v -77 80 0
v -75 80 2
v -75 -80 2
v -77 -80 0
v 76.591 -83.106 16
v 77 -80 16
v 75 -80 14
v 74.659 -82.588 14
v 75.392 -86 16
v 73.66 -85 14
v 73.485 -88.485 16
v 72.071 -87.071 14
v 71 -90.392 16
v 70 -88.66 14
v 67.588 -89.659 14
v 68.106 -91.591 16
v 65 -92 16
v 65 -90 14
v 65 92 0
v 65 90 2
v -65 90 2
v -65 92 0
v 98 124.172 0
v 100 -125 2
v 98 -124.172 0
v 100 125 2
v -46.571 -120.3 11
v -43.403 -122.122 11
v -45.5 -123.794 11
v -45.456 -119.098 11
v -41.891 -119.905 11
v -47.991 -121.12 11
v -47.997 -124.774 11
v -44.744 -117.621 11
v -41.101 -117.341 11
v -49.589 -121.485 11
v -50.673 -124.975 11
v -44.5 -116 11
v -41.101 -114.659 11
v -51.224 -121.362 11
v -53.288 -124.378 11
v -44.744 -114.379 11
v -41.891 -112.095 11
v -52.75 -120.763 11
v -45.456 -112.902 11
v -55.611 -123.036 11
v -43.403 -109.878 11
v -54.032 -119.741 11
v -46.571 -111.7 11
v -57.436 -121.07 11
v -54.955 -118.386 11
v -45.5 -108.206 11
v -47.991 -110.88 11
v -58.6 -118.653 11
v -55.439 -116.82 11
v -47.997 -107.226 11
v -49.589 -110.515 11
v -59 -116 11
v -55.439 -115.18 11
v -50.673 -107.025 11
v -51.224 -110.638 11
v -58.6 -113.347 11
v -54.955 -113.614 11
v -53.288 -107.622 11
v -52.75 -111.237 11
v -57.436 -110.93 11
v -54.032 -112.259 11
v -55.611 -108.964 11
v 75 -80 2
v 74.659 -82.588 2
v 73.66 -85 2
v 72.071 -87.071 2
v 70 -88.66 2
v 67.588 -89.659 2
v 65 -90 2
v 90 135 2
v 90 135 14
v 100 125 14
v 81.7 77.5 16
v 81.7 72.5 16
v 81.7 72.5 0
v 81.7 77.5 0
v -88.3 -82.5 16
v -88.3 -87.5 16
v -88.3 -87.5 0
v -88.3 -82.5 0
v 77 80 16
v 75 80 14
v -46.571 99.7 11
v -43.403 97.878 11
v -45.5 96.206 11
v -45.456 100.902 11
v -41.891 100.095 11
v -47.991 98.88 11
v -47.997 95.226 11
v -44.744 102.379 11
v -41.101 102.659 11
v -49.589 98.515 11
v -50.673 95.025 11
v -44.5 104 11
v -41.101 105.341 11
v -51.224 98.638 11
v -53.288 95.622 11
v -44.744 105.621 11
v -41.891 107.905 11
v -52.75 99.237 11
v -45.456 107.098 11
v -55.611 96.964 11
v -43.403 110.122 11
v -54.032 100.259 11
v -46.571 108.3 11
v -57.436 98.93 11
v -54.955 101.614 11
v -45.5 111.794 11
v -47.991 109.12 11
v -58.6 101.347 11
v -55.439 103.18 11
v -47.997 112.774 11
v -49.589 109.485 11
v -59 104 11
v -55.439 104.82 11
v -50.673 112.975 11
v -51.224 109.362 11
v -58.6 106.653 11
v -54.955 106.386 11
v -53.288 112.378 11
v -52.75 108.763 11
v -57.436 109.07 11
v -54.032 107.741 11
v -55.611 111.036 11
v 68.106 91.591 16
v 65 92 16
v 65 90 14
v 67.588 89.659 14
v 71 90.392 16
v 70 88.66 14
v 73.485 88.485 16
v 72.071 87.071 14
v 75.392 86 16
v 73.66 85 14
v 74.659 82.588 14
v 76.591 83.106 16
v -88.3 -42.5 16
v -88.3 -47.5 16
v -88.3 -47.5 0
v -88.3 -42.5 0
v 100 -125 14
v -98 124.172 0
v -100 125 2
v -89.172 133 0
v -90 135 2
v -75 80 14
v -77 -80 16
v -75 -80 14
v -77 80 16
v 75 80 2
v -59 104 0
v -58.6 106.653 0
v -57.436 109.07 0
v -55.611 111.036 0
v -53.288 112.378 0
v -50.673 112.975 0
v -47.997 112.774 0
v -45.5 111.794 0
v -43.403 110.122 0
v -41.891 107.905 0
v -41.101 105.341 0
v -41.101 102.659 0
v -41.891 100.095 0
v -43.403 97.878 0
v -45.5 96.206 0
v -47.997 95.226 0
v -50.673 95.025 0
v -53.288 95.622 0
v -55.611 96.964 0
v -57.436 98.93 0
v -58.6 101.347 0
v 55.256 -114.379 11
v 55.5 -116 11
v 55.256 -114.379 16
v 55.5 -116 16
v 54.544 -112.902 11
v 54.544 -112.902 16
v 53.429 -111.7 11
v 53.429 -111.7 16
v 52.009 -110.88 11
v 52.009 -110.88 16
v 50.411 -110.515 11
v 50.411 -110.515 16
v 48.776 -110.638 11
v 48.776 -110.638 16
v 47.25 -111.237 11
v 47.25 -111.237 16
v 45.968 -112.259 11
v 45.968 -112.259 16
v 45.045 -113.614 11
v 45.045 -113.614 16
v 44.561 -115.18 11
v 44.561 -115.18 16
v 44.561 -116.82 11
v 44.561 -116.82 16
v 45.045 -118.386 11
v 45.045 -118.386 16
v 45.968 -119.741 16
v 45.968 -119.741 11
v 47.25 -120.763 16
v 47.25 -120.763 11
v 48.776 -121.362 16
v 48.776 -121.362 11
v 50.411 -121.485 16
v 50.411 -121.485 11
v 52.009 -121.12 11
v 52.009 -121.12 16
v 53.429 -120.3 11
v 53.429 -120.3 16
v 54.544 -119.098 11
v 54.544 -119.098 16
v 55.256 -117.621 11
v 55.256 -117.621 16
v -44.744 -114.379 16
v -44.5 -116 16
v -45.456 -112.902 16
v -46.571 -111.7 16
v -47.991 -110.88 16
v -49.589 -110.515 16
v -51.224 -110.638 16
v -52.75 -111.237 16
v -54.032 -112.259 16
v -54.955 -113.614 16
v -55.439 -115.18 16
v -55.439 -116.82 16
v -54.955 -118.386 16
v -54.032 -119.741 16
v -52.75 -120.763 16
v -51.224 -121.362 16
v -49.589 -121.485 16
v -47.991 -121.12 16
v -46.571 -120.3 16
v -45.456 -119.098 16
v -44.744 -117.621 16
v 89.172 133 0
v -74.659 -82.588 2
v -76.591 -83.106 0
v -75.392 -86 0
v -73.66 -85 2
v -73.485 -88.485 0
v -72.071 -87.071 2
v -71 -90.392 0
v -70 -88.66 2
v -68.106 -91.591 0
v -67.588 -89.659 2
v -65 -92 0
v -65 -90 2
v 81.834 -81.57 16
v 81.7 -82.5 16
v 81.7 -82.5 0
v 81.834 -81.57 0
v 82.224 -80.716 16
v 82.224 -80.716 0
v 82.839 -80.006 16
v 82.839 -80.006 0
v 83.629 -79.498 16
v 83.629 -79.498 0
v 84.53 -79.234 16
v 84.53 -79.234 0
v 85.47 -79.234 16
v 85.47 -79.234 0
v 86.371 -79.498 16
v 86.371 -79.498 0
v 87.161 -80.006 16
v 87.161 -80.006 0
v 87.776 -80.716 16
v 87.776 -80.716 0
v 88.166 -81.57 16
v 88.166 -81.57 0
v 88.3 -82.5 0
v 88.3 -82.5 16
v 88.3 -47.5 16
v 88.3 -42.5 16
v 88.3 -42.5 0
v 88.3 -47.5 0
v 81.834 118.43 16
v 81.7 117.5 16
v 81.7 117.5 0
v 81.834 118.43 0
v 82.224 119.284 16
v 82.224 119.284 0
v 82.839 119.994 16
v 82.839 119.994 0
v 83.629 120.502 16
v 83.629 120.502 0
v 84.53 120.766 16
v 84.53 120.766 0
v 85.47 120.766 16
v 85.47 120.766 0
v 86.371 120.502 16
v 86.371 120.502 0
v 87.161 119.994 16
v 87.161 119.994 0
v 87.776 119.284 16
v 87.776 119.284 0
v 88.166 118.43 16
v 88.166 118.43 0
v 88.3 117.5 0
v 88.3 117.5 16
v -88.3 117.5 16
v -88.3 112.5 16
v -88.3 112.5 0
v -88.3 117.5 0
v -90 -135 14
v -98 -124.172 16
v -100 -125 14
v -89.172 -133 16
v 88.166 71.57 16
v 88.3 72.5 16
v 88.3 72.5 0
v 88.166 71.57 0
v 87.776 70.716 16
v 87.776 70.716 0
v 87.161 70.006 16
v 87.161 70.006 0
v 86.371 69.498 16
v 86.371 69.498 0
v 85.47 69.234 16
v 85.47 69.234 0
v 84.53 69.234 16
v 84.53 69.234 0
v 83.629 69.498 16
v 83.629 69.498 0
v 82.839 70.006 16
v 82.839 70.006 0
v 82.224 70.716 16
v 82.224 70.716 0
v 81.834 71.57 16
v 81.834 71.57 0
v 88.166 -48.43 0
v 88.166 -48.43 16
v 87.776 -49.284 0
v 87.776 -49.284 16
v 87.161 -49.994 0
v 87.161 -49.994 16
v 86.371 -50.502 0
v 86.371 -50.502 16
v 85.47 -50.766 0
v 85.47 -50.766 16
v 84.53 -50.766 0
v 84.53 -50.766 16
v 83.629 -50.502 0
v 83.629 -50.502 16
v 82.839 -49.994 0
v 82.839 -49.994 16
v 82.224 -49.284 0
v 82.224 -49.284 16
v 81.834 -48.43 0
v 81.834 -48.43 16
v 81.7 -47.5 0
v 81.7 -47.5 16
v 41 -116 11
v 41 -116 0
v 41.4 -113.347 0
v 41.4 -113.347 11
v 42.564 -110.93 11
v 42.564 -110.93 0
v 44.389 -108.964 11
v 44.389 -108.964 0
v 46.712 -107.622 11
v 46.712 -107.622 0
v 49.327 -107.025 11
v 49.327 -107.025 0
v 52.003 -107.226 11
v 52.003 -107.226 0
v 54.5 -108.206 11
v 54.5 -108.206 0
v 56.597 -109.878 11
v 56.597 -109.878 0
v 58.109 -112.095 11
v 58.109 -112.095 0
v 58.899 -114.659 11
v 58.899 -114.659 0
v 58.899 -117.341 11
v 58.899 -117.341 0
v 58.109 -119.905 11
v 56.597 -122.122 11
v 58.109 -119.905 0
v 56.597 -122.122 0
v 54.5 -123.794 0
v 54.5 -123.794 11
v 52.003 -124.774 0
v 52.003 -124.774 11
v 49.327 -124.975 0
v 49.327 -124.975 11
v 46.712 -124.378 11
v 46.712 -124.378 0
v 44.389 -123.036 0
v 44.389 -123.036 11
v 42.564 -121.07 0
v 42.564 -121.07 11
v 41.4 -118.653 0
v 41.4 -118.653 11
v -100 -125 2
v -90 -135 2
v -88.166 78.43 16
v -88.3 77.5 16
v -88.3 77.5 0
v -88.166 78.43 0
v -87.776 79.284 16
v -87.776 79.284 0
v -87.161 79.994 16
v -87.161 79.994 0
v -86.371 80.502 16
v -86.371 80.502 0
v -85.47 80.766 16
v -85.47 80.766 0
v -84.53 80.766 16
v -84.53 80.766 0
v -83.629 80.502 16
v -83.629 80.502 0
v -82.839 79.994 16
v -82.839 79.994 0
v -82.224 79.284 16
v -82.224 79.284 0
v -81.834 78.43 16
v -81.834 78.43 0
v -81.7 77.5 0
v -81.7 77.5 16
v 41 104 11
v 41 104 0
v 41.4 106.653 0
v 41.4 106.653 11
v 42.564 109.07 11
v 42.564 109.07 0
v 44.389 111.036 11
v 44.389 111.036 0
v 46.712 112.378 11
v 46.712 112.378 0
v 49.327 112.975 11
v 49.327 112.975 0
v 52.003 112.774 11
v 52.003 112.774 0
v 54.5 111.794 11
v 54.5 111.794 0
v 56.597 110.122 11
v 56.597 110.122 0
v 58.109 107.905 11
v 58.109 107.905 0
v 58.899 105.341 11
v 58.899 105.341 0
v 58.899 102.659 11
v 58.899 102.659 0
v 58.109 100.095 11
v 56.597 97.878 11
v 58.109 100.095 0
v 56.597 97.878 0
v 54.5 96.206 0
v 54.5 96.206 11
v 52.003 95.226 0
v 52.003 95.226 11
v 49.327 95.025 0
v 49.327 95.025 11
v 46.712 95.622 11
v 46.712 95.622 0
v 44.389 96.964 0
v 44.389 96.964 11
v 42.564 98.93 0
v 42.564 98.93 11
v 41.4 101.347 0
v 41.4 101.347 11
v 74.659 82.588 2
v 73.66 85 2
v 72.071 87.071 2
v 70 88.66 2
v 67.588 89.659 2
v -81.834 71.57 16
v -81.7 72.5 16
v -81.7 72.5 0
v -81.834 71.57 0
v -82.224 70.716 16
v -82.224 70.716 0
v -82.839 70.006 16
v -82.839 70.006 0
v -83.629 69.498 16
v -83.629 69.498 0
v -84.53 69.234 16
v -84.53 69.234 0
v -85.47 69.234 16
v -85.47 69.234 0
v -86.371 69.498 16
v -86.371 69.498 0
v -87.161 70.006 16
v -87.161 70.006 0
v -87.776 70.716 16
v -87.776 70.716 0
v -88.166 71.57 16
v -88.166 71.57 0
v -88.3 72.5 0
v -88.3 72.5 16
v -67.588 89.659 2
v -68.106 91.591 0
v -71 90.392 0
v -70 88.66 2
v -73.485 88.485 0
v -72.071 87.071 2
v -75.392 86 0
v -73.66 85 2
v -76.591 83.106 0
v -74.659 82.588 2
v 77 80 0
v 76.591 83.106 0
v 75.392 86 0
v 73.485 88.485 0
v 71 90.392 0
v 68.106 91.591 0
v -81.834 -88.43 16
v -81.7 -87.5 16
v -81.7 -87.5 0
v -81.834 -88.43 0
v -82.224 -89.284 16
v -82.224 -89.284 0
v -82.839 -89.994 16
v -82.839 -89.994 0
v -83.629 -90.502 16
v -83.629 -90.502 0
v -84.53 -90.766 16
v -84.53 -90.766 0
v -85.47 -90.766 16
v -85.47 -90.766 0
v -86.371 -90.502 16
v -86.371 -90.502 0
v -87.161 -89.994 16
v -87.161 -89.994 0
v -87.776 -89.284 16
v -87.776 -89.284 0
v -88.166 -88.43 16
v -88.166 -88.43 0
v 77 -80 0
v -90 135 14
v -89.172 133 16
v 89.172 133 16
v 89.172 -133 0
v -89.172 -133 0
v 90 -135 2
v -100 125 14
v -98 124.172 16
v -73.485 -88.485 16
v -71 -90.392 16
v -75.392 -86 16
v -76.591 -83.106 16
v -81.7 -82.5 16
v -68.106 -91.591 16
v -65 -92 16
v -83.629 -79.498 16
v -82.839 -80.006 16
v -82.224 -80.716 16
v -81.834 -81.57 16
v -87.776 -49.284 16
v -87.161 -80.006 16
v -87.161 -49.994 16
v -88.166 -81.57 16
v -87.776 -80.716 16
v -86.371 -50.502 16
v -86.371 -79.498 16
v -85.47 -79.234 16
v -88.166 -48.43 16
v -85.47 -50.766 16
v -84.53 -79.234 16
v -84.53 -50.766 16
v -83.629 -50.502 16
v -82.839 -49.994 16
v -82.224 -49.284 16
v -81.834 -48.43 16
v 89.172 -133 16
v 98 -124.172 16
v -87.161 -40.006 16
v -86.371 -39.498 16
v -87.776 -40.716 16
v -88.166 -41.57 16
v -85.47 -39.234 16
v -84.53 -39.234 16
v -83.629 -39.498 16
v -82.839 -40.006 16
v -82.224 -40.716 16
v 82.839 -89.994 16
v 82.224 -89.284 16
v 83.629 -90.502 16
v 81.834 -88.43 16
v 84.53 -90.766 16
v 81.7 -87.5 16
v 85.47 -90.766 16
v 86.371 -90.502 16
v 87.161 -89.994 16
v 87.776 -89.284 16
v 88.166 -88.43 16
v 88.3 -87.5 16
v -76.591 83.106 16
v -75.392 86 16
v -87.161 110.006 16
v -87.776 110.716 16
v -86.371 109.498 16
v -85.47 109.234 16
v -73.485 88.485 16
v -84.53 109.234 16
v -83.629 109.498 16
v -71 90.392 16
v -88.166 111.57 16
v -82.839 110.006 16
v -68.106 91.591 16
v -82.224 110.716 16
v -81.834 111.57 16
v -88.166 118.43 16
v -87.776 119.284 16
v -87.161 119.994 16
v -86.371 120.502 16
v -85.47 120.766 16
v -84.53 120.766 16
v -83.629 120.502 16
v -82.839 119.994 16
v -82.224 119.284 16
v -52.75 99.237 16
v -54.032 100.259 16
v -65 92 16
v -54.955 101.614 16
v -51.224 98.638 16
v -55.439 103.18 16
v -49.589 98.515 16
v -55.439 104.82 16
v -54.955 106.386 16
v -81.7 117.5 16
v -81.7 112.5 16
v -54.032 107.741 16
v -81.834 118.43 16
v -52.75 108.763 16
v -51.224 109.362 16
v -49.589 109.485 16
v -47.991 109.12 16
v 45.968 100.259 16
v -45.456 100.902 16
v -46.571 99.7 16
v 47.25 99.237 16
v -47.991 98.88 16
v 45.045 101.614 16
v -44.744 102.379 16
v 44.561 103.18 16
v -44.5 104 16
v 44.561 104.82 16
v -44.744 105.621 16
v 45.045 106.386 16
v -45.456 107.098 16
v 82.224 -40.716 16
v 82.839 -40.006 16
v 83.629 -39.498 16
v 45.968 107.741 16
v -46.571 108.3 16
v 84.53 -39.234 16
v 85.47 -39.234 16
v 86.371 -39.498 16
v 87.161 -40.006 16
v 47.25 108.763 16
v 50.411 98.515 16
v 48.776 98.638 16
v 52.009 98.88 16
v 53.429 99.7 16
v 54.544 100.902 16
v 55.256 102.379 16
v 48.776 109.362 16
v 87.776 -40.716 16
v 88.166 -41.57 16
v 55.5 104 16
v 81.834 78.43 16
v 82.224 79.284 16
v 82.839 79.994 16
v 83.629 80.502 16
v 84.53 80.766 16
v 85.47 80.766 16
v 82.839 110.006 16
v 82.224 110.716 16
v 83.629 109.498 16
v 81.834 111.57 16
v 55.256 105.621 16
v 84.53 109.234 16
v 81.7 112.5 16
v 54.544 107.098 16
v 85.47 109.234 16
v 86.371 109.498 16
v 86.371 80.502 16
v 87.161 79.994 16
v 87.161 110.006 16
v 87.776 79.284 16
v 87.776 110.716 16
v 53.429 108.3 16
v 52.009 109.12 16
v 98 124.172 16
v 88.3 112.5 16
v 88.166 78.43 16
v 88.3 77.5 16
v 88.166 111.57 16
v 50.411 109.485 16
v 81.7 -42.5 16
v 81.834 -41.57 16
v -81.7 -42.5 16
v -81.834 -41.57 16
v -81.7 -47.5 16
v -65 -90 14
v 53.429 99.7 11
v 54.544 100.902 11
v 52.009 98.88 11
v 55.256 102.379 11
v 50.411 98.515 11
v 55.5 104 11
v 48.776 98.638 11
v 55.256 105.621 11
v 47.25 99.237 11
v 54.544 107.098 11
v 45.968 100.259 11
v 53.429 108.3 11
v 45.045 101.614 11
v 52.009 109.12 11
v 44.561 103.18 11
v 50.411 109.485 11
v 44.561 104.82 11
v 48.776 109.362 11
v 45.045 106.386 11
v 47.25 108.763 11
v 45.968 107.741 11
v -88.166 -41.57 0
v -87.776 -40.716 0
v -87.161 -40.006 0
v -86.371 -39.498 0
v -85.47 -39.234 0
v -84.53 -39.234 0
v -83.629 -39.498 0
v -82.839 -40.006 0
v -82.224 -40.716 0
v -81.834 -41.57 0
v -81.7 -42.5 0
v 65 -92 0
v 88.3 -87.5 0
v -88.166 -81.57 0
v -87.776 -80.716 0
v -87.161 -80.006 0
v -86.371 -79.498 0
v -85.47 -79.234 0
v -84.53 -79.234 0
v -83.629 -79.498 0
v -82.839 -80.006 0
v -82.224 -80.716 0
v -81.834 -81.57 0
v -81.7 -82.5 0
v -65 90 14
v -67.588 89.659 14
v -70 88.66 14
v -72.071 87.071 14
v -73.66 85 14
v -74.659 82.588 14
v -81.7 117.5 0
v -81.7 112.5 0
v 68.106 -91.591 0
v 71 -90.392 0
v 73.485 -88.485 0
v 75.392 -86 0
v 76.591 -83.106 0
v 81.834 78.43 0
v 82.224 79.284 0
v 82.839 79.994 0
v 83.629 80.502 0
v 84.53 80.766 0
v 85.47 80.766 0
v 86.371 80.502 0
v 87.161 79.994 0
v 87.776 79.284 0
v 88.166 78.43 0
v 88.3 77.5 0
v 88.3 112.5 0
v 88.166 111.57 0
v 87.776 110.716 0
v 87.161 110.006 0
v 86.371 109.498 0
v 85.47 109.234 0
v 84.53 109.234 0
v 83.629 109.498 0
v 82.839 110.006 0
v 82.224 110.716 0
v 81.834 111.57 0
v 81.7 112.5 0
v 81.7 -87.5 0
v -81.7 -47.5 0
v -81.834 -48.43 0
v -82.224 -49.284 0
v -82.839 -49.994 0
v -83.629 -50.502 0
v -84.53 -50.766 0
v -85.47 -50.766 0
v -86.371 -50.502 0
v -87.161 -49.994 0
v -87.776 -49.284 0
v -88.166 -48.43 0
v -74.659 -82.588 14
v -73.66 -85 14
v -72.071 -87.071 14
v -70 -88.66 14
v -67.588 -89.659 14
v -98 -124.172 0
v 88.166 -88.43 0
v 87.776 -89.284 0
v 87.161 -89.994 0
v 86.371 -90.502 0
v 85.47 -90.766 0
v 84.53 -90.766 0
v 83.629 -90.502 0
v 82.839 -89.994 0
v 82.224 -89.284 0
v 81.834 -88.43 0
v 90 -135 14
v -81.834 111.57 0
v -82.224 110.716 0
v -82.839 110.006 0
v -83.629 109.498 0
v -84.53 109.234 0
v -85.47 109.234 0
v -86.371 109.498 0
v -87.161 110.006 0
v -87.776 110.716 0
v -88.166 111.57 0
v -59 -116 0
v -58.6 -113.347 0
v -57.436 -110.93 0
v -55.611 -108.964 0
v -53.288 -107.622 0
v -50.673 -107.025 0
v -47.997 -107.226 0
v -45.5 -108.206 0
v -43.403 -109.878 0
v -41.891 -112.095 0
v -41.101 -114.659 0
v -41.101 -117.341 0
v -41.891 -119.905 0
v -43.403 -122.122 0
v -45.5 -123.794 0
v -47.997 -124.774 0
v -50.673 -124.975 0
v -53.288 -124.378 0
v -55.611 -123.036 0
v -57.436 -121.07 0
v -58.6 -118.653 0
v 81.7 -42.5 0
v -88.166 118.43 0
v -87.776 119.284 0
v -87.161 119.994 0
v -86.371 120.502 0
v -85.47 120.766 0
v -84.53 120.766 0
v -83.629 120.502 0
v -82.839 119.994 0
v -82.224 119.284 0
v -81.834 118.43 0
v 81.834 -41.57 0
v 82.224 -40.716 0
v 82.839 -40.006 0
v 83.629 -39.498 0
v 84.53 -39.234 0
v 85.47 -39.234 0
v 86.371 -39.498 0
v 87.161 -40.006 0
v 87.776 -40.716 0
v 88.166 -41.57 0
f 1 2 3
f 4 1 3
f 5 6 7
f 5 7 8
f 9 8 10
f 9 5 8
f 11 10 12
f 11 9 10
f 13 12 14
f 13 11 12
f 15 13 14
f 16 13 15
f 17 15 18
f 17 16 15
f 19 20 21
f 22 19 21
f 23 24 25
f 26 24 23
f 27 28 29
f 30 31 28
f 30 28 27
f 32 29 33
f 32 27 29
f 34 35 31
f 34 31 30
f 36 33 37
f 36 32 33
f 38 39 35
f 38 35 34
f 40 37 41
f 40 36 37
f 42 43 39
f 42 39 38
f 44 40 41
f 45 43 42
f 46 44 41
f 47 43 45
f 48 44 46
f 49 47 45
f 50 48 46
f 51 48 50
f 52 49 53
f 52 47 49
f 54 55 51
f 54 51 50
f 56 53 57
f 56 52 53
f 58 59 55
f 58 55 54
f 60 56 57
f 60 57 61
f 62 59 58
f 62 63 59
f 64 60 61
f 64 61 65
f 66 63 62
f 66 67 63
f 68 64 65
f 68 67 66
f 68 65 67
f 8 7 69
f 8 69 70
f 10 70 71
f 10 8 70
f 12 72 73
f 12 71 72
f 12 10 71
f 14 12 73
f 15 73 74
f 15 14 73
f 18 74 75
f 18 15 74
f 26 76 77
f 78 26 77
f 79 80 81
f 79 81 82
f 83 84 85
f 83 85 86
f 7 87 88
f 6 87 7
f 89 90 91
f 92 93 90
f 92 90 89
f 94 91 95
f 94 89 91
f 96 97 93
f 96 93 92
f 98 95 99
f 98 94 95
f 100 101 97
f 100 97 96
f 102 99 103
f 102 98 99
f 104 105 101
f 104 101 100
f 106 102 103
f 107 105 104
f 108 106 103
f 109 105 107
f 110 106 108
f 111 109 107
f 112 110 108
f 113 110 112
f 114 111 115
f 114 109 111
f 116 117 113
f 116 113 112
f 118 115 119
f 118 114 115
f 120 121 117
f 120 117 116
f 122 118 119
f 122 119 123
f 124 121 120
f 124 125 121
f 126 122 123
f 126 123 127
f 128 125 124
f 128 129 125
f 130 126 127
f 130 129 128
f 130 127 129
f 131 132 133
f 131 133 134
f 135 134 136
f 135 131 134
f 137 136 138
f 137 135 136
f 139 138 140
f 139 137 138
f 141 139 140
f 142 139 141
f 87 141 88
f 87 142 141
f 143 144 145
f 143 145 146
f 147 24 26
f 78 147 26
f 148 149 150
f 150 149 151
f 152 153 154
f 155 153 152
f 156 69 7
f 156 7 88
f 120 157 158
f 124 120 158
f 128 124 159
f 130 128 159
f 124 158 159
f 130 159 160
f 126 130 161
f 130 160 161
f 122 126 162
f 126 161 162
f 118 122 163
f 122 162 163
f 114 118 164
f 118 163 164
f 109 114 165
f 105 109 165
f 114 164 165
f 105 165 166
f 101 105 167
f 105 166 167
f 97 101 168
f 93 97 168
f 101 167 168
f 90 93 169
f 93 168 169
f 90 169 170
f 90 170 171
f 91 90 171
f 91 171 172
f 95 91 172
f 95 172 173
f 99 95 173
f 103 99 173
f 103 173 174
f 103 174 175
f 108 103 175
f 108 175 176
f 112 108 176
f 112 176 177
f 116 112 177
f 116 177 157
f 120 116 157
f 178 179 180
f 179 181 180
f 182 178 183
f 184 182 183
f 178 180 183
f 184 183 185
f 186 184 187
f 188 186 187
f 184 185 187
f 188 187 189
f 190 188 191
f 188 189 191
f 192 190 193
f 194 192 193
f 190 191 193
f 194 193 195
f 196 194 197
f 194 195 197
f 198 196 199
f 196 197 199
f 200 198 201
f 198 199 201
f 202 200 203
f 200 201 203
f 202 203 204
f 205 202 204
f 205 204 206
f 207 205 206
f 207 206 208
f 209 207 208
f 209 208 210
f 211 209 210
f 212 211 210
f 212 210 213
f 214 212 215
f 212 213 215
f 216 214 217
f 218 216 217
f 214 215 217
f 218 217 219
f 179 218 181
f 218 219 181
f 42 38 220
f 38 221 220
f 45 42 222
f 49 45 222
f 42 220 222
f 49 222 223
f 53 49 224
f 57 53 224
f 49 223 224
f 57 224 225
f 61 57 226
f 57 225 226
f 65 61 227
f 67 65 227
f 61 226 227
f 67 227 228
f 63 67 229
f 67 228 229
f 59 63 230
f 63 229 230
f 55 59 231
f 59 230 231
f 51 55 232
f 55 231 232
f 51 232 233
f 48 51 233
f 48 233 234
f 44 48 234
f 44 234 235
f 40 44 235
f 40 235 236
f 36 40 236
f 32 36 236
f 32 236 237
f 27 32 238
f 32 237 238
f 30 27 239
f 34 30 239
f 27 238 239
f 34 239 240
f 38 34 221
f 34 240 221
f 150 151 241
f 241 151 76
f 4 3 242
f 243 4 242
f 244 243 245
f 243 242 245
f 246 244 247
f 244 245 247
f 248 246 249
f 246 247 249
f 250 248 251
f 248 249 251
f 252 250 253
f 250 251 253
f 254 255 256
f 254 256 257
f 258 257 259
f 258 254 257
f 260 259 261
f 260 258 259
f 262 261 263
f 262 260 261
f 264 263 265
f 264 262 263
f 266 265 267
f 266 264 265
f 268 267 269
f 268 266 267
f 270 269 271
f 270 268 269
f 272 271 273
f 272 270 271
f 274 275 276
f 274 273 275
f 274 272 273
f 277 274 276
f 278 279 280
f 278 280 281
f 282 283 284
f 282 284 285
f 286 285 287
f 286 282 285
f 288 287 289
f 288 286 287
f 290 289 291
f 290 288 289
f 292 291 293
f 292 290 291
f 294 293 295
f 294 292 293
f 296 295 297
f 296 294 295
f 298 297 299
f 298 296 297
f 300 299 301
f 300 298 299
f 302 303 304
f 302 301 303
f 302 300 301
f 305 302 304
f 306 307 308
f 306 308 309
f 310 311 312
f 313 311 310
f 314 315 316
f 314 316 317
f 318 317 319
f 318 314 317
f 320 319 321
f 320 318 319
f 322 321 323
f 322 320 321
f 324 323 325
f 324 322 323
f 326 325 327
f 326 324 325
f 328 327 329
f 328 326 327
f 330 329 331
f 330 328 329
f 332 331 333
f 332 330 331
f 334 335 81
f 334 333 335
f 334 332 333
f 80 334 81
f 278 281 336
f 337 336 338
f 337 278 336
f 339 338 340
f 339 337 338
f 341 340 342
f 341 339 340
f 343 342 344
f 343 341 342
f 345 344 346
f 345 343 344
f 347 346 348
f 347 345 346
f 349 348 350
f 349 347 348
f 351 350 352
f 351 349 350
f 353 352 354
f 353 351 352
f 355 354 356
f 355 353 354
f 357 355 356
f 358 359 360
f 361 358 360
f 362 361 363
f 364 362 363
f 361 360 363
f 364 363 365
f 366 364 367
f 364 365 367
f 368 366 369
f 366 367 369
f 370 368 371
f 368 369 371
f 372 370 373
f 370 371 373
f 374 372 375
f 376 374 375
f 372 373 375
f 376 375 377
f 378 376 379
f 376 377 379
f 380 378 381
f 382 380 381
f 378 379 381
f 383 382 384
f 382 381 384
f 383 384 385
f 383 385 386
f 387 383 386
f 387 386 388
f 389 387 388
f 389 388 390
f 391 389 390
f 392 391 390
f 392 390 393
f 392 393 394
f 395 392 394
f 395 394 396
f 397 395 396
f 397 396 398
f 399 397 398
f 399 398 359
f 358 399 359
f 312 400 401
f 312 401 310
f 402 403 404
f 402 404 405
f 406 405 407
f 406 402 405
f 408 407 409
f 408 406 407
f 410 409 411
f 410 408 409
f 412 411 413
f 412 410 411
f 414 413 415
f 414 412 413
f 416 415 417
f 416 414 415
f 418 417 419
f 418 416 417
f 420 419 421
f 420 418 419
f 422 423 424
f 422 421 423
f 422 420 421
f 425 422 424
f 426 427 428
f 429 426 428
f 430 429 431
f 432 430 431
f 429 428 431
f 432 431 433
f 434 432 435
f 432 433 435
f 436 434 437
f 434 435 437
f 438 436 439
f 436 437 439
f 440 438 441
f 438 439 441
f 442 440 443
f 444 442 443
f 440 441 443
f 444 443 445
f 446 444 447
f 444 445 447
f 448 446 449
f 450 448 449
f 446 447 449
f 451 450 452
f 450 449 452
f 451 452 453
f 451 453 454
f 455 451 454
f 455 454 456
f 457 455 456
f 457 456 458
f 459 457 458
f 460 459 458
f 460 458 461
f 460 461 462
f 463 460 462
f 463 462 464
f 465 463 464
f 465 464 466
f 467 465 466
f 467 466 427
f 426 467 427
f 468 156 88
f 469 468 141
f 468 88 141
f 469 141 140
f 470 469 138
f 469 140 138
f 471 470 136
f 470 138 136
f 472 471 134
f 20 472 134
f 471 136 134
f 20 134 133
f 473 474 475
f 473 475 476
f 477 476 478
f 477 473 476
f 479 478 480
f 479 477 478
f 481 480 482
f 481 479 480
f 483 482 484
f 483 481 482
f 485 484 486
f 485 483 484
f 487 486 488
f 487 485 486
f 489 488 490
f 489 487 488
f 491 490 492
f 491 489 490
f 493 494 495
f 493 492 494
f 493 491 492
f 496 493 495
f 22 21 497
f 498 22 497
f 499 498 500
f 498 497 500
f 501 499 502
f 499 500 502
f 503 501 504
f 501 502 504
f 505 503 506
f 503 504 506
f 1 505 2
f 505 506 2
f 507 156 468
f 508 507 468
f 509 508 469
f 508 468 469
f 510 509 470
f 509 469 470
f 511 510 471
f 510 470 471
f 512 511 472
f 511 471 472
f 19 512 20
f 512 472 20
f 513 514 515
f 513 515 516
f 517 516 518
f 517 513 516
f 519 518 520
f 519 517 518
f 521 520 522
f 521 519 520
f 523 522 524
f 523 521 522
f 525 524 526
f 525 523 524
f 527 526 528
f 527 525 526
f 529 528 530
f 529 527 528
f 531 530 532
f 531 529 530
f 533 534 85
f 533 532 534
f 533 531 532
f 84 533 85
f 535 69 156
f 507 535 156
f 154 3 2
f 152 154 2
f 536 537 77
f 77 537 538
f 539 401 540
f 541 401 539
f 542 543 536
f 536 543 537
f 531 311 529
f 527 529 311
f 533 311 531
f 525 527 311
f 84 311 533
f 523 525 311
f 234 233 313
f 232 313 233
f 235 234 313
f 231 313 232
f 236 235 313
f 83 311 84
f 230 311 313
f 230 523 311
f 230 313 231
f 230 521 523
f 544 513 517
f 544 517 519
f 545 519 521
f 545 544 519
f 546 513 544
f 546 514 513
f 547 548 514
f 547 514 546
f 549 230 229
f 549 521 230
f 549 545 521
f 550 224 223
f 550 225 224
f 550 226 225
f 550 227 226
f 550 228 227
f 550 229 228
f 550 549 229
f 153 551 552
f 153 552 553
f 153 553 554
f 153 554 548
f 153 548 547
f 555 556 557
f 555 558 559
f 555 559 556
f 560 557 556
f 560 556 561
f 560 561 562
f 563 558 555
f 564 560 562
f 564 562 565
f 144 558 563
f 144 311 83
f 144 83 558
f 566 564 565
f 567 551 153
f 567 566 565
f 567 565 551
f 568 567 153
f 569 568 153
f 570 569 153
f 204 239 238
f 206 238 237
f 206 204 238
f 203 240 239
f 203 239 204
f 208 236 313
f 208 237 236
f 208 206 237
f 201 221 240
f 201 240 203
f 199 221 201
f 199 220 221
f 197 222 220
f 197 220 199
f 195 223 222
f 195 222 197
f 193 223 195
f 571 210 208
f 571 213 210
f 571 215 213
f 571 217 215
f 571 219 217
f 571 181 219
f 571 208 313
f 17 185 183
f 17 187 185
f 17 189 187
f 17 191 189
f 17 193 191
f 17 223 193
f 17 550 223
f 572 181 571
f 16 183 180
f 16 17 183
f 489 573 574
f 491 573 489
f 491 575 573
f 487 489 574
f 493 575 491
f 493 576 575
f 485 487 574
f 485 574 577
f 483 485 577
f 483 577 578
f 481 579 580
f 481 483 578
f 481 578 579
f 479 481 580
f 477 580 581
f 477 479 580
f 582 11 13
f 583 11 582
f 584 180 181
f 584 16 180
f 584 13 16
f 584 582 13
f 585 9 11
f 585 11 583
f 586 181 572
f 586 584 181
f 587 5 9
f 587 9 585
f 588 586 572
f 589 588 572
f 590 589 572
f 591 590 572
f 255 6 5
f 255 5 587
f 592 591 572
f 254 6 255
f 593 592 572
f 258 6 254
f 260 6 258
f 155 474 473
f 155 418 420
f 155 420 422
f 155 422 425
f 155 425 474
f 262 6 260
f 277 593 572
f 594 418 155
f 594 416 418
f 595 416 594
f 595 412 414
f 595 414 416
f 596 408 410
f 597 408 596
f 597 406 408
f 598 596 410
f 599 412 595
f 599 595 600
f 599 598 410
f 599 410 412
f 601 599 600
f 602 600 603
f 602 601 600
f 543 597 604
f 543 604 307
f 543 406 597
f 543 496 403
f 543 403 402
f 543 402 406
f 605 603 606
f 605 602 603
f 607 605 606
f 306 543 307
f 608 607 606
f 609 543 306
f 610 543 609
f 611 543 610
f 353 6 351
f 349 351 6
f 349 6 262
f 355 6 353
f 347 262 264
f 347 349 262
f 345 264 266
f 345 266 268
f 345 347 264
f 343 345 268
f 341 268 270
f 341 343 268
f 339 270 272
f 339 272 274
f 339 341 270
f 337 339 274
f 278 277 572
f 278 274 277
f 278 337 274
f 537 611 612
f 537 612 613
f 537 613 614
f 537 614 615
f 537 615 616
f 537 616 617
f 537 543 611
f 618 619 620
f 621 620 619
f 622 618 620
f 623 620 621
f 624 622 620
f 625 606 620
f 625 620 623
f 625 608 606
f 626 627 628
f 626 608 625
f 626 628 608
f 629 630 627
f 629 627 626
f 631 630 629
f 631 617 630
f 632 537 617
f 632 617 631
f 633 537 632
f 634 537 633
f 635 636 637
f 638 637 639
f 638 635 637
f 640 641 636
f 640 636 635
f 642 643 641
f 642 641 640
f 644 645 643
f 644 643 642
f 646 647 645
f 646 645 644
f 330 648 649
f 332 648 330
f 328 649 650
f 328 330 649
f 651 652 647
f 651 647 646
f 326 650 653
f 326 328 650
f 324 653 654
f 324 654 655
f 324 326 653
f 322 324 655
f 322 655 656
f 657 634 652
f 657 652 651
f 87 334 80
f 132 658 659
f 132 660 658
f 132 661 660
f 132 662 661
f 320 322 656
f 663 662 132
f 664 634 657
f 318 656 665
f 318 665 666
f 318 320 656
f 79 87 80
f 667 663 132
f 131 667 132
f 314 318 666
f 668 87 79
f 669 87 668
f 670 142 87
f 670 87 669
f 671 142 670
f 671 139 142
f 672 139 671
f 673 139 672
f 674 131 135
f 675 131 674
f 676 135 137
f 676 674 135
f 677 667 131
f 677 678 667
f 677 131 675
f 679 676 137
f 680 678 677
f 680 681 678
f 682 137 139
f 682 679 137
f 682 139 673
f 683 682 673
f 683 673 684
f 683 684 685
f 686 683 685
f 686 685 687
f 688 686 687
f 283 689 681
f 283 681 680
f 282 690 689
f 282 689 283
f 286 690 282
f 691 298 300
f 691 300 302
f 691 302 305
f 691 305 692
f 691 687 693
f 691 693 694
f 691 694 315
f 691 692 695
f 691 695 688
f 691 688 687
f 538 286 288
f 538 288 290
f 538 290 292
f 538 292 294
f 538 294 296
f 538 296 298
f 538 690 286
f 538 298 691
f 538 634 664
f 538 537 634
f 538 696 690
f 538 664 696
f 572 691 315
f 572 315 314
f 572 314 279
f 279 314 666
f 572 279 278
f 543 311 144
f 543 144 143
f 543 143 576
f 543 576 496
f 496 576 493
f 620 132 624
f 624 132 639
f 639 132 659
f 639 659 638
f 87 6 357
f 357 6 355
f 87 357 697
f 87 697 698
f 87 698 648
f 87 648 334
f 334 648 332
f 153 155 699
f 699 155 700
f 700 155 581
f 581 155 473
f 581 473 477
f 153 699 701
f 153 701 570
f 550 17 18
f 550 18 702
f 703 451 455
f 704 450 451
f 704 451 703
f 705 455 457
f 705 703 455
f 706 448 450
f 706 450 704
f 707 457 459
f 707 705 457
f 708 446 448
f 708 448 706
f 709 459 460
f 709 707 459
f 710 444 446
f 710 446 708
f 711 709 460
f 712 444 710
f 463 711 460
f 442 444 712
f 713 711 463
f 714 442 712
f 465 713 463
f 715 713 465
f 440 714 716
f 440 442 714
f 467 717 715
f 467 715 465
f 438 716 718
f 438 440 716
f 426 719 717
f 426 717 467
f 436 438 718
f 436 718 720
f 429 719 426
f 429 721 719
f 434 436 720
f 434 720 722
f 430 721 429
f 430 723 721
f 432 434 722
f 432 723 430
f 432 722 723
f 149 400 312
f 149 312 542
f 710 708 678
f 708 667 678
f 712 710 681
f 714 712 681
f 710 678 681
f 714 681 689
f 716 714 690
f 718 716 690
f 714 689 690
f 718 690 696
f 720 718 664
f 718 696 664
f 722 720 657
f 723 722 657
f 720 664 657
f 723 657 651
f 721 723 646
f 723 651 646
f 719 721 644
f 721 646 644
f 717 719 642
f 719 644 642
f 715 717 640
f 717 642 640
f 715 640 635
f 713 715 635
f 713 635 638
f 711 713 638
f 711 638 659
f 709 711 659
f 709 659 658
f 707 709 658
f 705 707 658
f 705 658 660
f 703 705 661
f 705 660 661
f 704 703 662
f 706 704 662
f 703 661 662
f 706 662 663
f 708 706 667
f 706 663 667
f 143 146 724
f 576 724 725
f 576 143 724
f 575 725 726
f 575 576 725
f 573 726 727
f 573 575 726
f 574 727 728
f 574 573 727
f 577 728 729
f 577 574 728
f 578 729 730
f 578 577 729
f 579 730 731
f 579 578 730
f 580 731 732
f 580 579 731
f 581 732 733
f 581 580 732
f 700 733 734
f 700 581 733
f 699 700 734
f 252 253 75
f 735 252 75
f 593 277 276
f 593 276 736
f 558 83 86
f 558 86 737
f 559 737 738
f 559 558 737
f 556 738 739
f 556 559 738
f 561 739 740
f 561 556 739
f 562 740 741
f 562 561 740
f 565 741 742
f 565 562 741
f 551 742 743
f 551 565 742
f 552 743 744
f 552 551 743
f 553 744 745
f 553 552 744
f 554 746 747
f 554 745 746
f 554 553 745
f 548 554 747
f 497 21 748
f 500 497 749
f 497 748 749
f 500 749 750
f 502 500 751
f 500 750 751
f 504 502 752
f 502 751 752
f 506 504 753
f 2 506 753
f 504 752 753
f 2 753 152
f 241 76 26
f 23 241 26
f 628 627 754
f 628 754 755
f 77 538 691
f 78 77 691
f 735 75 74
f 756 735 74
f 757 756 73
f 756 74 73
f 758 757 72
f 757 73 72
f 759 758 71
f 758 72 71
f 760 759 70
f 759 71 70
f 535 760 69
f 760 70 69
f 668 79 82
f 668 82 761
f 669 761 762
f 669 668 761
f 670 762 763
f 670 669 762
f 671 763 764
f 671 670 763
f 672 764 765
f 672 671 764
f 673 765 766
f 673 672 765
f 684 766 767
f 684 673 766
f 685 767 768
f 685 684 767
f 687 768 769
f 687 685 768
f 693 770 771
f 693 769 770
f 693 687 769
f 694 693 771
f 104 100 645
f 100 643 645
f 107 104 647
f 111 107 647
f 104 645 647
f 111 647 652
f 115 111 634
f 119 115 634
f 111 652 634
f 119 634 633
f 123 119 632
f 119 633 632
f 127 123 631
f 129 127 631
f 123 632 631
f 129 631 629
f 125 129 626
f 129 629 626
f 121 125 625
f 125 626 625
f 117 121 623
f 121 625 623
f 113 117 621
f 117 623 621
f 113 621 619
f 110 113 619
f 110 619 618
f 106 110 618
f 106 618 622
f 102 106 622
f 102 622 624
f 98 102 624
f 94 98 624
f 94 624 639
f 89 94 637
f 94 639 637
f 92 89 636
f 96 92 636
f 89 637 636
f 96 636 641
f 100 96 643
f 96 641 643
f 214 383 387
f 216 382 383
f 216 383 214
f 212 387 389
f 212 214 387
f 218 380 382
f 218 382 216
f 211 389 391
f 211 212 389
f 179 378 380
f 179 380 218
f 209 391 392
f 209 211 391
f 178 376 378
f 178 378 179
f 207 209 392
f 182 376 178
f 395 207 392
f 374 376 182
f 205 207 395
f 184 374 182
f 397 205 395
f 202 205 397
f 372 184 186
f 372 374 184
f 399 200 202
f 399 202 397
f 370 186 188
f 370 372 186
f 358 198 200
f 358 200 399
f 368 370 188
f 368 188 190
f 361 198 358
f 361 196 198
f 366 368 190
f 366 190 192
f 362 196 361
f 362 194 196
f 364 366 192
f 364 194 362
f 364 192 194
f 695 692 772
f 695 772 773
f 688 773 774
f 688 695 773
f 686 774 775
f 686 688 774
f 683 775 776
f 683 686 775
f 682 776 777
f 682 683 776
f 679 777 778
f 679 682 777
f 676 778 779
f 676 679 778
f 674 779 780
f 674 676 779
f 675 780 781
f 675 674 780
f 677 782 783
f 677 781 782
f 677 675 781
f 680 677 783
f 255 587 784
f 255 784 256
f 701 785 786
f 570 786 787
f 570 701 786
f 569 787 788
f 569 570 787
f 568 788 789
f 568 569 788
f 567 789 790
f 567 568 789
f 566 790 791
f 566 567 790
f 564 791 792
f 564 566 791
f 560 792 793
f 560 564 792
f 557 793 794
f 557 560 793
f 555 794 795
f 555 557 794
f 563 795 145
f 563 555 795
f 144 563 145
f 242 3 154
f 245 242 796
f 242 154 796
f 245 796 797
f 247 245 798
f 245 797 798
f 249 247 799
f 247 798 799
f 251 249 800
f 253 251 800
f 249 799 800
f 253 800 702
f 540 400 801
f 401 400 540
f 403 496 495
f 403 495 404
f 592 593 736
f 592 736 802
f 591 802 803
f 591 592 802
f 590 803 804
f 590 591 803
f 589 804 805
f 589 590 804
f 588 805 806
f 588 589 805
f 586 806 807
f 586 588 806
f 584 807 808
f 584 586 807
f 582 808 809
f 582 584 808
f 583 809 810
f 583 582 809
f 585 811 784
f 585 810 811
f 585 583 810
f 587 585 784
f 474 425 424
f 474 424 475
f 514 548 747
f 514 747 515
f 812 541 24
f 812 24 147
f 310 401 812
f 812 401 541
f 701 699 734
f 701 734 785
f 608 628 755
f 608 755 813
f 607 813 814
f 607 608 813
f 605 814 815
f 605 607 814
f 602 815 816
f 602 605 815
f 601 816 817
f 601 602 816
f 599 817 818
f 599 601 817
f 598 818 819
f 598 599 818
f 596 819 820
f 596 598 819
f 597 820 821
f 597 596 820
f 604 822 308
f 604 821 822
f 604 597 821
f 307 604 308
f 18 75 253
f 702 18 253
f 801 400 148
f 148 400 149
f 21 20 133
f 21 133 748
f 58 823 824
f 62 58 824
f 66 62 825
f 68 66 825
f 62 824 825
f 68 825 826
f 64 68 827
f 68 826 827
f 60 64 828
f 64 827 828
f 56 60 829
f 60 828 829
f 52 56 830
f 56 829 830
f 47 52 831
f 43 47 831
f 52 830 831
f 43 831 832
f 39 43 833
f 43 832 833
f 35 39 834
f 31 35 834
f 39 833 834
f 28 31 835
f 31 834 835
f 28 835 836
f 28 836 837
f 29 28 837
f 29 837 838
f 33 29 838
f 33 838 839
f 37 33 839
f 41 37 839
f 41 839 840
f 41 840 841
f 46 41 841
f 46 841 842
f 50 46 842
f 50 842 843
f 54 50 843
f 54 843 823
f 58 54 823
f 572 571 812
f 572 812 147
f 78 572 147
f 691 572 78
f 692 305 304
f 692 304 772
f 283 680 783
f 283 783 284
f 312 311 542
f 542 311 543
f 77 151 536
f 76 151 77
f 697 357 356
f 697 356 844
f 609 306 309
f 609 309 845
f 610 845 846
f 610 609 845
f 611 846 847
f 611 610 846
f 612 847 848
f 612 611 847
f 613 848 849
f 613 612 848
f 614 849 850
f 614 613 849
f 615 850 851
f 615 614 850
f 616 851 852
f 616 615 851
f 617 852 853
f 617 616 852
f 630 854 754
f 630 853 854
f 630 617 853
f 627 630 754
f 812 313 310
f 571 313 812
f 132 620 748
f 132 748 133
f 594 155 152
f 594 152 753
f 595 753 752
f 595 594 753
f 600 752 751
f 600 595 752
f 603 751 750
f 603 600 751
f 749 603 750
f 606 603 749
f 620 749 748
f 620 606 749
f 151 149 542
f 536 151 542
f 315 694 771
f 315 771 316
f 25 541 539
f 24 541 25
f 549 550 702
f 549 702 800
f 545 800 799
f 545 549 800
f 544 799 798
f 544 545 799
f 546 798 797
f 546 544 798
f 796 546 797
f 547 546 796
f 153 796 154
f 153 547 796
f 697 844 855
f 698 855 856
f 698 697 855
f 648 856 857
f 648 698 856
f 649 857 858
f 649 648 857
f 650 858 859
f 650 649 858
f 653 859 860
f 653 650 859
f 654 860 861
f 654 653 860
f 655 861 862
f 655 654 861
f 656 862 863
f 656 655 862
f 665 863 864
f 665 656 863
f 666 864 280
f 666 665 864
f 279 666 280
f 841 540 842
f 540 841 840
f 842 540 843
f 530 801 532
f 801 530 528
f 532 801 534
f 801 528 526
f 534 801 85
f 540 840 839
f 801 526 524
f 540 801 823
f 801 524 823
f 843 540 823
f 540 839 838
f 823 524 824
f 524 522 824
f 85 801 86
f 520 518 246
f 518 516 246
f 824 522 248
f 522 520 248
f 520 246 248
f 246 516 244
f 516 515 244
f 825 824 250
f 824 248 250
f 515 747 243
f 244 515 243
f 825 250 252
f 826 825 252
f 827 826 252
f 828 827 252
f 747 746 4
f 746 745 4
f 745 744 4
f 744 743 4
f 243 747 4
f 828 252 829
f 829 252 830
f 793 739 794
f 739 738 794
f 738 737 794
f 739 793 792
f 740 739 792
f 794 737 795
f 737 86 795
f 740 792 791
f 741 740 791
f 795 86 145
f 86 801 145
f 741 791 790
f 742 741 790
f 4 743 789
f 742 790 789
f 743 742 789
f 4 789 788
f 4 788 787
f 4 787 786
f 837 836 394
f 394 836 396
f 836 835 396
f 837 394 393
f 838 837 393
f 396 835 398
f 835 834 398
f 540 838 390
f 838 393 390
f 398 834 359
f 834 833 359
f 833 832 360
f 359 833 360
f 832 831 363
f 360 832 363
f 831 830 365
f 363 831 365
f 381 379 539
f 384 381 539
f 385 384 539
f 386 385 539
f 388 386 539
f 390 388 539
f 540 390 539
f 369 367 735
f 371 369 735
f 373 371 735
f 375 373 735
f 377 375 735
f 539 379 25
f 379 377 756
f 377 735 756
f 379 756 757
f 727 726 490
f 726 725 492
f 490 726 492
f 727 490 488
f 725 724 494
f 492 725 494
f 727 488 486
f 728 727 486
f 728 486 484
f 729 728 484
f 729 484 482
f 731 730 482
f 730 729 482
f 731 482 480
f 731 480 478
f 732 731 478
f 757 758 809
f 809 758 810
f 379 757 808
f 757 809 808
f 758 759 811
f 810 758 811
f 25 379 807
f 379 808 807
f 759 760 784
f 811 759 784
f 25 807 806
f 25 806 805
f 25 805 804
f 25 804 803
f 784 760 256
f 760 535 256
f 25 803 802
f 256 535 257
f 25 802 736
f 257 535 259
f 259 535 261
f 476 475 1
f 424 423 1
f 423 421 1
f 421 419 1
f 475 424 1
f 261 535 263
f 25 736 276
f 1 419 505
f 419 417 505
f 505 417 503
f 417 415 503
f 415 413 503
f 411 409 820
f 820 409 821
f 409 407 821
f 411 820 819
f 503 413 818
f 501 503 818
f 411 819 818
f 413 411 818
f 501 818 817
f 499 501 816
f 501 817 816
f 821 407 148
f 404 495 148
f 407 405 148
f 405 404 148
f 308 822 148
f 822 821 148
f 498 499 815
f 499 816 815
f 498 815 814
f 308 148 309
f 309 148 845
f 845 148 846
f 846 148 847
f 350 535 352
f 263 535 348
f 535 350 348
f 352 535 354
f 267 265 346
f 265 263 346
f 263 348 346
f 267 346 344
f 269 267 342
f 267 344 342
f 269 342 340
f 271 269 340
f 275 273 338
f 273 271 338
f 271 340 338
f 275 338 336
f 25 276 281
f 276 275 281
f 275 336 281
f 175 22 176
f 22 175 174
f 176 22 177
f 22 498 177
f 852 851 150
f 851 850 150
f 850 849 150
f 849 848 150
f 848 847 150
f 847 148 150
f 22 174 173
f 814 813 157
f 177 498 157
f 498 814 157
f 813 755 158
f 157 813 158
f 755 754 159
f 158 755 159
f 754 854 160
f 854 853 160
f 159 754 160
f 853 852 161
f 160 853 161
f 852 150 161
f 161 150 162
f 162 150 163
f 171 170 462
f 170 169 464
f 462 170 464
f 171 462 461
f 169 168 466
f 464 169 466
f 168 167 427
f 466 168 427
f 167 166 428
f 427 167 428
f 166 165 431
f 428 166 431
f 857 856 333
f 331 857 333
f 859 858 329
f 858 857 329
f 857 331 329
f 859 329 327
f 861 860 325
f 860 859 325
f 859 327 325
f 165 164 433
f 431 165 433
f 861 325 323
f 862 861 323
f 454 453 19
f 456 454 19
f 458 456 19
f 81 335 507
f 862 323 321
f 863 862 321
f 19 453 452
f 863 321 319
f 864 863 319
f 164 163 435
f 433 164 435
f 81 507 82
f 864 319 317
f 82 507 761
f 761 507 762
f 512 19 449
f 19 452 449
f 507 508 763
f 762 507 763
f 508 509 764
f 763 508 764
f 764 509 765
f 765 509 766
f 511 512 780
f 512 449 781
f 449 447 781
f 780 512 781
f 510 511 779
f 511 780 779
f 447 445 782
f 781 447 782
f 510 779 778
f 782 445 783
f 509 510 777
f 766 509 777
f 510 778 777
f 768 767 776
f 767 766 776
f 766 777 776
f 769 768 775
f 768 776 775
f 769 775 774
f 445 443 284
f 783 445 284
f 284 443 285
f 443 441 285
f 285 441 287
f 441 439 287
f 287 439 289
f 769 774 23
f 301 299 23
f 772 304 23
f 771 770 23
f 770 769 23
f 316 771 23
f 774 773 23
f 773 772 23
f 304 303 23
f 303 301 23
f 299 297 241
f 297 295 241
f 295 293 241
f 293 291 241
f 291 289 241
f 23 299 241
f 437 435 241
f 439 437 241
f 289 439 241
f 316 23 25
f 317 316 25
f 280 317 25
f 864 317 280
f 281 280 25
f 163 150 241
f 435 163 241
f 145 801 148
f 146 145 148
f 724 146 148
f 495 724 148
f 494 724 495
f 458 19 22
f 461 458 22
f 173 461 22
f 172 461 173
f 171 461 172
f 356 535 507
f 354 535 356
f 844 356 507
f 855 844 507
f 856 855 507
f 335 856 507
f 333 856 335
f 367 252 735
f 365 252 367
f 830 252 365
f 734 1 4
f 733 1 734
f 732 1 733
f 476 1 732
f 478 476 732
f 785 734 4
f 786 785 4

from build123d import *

# Parameters (mm, degrees)
SKETCH_1_W                = 200
SKETCH_1_H                = 270
EXTRUDE_1_DEPTH           = 16
HOLE_WIZARD_1_D           = 11
HOLE_WIZARD_1_CBORE_D     = 18
HOLE_WIZARD_1_CBORE_DEPTH = 11
CUT_EXTRUDE_1_DEPTH       = 169.763147636
SKETCH_5_W                = 150
SKETCH_5_H                = 180
CUT_EXTRUDE_2_DEPTH       = 169.763147636
FILLET_1_R                = 10
CHAMFER_1_SIZE            = 10
CHAMFER_2_SIZE            = 2


with BuildPart() as part:
    # 草图1 → 凸台-拉伸1 (new body)
    with BuildSketch(Plane.XY):
        Rectangle(SKETCH_1_W, SKETCH_1_H)
    extrude(amount=EXTRUDE_1_DEPTH)

    # 打孔尺寸(%根据)内六角圆柱头螺钉的类型1 (through all)
    with Locations(Plane(origin=(0, 0, 0), x_dir=(-1, 0, 0), z_dir=(0, 0, -1))):
        with Locations((-50, -116), (50, -116), (-50, 104), (50, 104)):
            CounterBoreHole(HOLE_WIZARD_1_D / 2, HOLE_WIZARD_1_CBORE_D / 2, HOLE_WIZARD_1_CBORE_DEPTH)

    # 草图4 → 切除-拉伸1 (cut, through all)
    with BuildSketch(Plane.XY.offset(16)):
        with BuildLine():
            Line((-88.3, 112.5), (-88.3, 117.5))
            ThreePointArc((-88.3, 117.5), (-85, 120.8), (-81.7, 117.5))
            Line((-81.7, 117.5), (-81.7, 112.5))
            ThreePointArc((-81.7, 112.5), (-85, 109.2), (-88.3, 112.5))
        make_face()
        with BuildLine():
            Line((81.7, 112.5), (81.7, 117.5))
            ThreePointArc((81.7, 117.5), (85, 120.8), (88.3, 117.5))
            Line((88.3, 117.5), (88.3, 112.5))
            ThreePointArc((88.3, 112.5), (85, 109.2), (81.7, 112.5))
        make_face()
        with BuildLine():
            Line((81.7, 72.5), (81.7, 77.5))
            ThreePointArc((81.7, 77.5), (85, 80.8), (88.3, 77.5))
            Line((88.3, 77.5), (88.3, 72.5))
            ThreePointArc((88.3, 72.5), (85, 69.2), (81.7, 72.5))
        make_face()
        with BuildLine():
            Line((-88.3, 72.5), (-88.3, 77.5))
            ThreePointArc((-88.3, 77.5), (-85, 80.8), (-81.7, 77.5))
            Line((-81.7, 77.5), (-81.7, 72.5))
            ThreePointArc((-81.7, 72.5), (-85, 69.2), (-88.3, 72.5))
        make_face()
        with BuildLine():
            Line((-88.3, -47.5), (-88.3, -42.5))
            ThreePointArc((-88.3, -42.5), (-85, -39.2), (-81.7, -42.5))
            Line((-81.7, -42.5), (-81.7, -47.5))
            ThreePointArc((-81.7, -47.5), (-85, -50.8), (-88.3, -47.5))
        make_face()
        with BuildLine():
            Line((-88.3, -87.5), (-88.3, -82.5))
            ThreePointArc((-88.3, -82.5), (-85, -79.2), (-81.7, -82.5))
            Line((-81.7, -82.5), (-81.7, -87.5))
            ThreePointArc((-81.7, -87.5), (-85, -90.8), (-88.3, -87.5))
        make_face()
        with BuildLine():
            Line((81.7, -47.5), (81.7, -42.5))
            ThreePointArc((81.7, -42.5), (85, -39.2), (88.3, -42.5))
            Line((88.3, -42.5), (88.3, -47.5))
            ThreePointArc((88.3, -47.5), (85, -50.8), (81.7, -47.5))
        make_face()
        with BuildLine():
            Line((81.7, -87.5), (81.7, -82.5))
            ThreePointArc((81.7, -82.5), (85, -79.2), (88.3, -82.5))
            Line((88.3, -82.5), (88.3, -87.5))
            ThreePointArc((88.3, -87.5), (85, -90.8), (81.7, -87.5))
        make_face()
    extrude(amount=-CUT_EXTRUDE_1_DEPTH, mode=Mode.SUBTRACT)

    # 草图5 → 切除-拉伸2 (cut, through all)
    with BuildSketch(Plane(origin=(0, 0, 0), x_dir=(-1, 0, 0), z_dir=(0, 0, -1))):
        Rectangle(SKETCH_5_W, SKETCH_5_H)
    extrude(amount=-CUT_EXTRUDE_2_DEPTH, mode=Mode.SUBTRACT)

    # 圆角1
    fillet_1_edges = [part.edges().sort_by_distance(p)[0] for p in [
        (75, -90, 8),
        (75, 90, 8),
        (-75, 90, 8),
        (-75, -90, 8),
    ]]
    fillet(fillet_1_edges, radius=FILLET_1_R)

    # 倒角1
    chamfer_1_edges = [part.edges().sort_by_distance(p)[0] for p in [
        (100, -135, 8),
        (-100, -135, 8),
        (-100, 135, 8),
        (100, 135, 8),
    ]]
    chamfer(chamfer_1_edges, length=CHAMFER_1_SIZE)

    # 倒角2
    chamfer_2_edges = [part.edges().sort_by_distance(p)[0] for p in [
        (0, 90, 0),
        (0, 90, 16),
        (-75, 0, 0),
        (-75, 0, 16),
        (75, 0, 0),
        (75, 0, 16),
        (0, -90, 0),
        (0, -90, 16),
        (-72.071067812, 87.071067812, 0),
        (-72.071067812, 87.071067812, 16),
        (72.071067812, 87.071067812, 0),
        (72.071067812, 87.071067812, 16),
        (-72.071067812, -87.071067812, 0),
        (-72.071067812, -87.071067812, 16),
        (72.071067812, -87.071067812, 0),
        (72.071067812, -87.071067812, 16),
        (100, 0, 0),
        (100, 0, 16),
        (0, -135, 0),
        (-100, 0, 0),
        (0, 135, 0),
        (-95, -130, 0),
        (-95, 130, 0),
        (95, 130, 0),
        (95, -130, 0),
        (0, -135, 16),
        (0, 135, 16),
        (-100, 0, 16),
        (-95, -130, 16),
        (-95, 130, 16),
        (95, 130, 16),
        (95, -130, 16),
    ]]
    chamfer(chamfer_2_edges, length=CHAMFER_2_SIZE)


solid = part.part
